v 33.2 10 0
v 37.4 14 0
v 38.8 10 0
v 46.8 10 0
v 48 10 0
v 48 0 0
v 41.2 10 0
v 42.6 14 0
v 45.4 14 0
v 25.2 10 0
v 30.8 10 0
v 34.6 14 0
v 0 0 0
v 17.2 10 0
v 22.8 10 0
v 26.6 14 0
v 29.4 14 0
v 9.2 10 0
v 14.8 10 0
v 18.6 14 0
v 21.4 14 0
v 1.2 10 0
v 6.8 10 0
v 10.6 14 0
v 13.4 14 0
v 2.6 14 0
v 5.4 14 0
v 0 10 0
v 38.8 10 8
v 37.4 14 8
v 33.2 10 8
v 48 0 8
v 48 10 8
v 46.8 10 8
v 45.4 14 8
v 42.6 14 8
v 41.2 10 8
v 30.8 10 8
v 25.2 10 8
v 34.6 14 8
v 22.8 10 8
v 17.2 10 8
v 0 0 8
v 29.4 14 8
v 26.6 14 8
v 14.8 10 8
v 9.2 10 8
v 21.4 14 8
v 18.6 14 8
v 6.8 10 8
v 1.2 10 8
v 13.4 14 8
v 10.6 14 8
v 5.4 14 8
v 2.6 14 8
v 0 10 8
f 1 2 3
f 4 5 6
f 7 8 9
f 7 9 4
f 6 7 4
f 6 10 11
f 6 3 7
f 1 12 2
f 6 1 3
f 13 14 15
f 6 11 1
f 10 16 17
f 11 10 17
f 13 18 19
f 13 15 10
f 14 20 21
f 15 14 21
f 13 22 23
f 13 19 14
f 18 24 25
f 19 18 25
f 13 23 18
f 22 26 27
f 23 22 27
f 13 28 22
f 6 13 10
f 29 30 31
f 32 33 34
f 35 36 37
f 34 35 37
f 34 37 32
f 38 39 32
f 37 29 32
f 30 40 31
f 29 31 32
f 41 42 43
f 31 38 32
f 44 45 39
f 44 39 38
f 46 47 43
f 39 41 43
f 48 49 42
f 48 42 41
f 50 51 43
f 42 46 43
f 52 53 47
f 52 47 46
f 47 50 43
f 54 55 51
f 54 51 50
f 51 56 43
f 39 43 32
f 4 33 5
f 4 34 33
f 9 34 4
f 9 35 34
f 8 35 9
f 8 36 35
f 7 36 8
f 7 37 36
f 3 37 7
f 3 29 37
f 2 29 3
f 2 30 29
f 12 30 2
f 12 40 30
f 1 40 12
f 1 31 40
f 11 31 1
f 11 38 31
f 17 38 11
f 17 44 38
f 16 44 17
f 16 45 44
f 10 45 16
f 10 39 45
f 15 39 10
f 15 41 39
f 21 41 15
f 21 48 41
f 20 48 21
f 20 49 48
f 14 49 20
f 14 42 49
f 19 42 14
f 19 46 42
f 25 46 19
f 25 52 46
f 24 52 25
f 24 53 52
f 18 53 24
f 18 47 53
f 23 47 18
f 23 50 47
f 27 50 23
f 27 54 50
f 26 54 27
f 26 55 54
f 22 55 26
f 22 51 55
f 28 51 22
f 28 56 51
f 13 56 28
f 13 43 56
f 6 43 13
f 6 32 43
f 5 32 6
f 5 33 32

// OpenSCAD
$fn = 32;

// ----------------------------------------------------------------------
// Gear rack: 6 teeth, pitch 8 mm
// ----------------------------------------------------------------------

// --- parameters (mm) ---
teeth = 6;                // number of teeth
pitch = 8;                // tooth pitch, X
root_w = 5.6;             // tooth width at the root
tip_w = 2.8;              // tooth width at the tip
base_h = 10;              // rack body height, Y
tooth_h = 4;              // tooth height above the body
plate_t = 8;              // rack width, Z (extrusion height)

rack_l = teeth * pitch;  // overall length
total_h = base_h + tooth_h;  // overall height

profile = [[0, 0], [48, 0], [48, 10], [46.8, 10], [45.4, 14], [42.6, 14], [41.2, 10], [38.8, 10], [37.4, 14], [34.6, 14], [33.2, 10], [30.8, 10], [29.4, 14], [26.6, 14], [25.2, 10], [22.8, 10], [21.4, 14], [18.6, 14], [17.2, 10], [14.8, 10], [13.4, 14], [10.6, 14], [9.2, 10], [6.8, 10], [5.4, 14], [2.6, 14], [1.2, 10], [0, 10]];  // primary outline, 28 points, counter clockwise

// --- the one profile operation ---
linear_extrude(height = plate_t) polygon(points = profile);
